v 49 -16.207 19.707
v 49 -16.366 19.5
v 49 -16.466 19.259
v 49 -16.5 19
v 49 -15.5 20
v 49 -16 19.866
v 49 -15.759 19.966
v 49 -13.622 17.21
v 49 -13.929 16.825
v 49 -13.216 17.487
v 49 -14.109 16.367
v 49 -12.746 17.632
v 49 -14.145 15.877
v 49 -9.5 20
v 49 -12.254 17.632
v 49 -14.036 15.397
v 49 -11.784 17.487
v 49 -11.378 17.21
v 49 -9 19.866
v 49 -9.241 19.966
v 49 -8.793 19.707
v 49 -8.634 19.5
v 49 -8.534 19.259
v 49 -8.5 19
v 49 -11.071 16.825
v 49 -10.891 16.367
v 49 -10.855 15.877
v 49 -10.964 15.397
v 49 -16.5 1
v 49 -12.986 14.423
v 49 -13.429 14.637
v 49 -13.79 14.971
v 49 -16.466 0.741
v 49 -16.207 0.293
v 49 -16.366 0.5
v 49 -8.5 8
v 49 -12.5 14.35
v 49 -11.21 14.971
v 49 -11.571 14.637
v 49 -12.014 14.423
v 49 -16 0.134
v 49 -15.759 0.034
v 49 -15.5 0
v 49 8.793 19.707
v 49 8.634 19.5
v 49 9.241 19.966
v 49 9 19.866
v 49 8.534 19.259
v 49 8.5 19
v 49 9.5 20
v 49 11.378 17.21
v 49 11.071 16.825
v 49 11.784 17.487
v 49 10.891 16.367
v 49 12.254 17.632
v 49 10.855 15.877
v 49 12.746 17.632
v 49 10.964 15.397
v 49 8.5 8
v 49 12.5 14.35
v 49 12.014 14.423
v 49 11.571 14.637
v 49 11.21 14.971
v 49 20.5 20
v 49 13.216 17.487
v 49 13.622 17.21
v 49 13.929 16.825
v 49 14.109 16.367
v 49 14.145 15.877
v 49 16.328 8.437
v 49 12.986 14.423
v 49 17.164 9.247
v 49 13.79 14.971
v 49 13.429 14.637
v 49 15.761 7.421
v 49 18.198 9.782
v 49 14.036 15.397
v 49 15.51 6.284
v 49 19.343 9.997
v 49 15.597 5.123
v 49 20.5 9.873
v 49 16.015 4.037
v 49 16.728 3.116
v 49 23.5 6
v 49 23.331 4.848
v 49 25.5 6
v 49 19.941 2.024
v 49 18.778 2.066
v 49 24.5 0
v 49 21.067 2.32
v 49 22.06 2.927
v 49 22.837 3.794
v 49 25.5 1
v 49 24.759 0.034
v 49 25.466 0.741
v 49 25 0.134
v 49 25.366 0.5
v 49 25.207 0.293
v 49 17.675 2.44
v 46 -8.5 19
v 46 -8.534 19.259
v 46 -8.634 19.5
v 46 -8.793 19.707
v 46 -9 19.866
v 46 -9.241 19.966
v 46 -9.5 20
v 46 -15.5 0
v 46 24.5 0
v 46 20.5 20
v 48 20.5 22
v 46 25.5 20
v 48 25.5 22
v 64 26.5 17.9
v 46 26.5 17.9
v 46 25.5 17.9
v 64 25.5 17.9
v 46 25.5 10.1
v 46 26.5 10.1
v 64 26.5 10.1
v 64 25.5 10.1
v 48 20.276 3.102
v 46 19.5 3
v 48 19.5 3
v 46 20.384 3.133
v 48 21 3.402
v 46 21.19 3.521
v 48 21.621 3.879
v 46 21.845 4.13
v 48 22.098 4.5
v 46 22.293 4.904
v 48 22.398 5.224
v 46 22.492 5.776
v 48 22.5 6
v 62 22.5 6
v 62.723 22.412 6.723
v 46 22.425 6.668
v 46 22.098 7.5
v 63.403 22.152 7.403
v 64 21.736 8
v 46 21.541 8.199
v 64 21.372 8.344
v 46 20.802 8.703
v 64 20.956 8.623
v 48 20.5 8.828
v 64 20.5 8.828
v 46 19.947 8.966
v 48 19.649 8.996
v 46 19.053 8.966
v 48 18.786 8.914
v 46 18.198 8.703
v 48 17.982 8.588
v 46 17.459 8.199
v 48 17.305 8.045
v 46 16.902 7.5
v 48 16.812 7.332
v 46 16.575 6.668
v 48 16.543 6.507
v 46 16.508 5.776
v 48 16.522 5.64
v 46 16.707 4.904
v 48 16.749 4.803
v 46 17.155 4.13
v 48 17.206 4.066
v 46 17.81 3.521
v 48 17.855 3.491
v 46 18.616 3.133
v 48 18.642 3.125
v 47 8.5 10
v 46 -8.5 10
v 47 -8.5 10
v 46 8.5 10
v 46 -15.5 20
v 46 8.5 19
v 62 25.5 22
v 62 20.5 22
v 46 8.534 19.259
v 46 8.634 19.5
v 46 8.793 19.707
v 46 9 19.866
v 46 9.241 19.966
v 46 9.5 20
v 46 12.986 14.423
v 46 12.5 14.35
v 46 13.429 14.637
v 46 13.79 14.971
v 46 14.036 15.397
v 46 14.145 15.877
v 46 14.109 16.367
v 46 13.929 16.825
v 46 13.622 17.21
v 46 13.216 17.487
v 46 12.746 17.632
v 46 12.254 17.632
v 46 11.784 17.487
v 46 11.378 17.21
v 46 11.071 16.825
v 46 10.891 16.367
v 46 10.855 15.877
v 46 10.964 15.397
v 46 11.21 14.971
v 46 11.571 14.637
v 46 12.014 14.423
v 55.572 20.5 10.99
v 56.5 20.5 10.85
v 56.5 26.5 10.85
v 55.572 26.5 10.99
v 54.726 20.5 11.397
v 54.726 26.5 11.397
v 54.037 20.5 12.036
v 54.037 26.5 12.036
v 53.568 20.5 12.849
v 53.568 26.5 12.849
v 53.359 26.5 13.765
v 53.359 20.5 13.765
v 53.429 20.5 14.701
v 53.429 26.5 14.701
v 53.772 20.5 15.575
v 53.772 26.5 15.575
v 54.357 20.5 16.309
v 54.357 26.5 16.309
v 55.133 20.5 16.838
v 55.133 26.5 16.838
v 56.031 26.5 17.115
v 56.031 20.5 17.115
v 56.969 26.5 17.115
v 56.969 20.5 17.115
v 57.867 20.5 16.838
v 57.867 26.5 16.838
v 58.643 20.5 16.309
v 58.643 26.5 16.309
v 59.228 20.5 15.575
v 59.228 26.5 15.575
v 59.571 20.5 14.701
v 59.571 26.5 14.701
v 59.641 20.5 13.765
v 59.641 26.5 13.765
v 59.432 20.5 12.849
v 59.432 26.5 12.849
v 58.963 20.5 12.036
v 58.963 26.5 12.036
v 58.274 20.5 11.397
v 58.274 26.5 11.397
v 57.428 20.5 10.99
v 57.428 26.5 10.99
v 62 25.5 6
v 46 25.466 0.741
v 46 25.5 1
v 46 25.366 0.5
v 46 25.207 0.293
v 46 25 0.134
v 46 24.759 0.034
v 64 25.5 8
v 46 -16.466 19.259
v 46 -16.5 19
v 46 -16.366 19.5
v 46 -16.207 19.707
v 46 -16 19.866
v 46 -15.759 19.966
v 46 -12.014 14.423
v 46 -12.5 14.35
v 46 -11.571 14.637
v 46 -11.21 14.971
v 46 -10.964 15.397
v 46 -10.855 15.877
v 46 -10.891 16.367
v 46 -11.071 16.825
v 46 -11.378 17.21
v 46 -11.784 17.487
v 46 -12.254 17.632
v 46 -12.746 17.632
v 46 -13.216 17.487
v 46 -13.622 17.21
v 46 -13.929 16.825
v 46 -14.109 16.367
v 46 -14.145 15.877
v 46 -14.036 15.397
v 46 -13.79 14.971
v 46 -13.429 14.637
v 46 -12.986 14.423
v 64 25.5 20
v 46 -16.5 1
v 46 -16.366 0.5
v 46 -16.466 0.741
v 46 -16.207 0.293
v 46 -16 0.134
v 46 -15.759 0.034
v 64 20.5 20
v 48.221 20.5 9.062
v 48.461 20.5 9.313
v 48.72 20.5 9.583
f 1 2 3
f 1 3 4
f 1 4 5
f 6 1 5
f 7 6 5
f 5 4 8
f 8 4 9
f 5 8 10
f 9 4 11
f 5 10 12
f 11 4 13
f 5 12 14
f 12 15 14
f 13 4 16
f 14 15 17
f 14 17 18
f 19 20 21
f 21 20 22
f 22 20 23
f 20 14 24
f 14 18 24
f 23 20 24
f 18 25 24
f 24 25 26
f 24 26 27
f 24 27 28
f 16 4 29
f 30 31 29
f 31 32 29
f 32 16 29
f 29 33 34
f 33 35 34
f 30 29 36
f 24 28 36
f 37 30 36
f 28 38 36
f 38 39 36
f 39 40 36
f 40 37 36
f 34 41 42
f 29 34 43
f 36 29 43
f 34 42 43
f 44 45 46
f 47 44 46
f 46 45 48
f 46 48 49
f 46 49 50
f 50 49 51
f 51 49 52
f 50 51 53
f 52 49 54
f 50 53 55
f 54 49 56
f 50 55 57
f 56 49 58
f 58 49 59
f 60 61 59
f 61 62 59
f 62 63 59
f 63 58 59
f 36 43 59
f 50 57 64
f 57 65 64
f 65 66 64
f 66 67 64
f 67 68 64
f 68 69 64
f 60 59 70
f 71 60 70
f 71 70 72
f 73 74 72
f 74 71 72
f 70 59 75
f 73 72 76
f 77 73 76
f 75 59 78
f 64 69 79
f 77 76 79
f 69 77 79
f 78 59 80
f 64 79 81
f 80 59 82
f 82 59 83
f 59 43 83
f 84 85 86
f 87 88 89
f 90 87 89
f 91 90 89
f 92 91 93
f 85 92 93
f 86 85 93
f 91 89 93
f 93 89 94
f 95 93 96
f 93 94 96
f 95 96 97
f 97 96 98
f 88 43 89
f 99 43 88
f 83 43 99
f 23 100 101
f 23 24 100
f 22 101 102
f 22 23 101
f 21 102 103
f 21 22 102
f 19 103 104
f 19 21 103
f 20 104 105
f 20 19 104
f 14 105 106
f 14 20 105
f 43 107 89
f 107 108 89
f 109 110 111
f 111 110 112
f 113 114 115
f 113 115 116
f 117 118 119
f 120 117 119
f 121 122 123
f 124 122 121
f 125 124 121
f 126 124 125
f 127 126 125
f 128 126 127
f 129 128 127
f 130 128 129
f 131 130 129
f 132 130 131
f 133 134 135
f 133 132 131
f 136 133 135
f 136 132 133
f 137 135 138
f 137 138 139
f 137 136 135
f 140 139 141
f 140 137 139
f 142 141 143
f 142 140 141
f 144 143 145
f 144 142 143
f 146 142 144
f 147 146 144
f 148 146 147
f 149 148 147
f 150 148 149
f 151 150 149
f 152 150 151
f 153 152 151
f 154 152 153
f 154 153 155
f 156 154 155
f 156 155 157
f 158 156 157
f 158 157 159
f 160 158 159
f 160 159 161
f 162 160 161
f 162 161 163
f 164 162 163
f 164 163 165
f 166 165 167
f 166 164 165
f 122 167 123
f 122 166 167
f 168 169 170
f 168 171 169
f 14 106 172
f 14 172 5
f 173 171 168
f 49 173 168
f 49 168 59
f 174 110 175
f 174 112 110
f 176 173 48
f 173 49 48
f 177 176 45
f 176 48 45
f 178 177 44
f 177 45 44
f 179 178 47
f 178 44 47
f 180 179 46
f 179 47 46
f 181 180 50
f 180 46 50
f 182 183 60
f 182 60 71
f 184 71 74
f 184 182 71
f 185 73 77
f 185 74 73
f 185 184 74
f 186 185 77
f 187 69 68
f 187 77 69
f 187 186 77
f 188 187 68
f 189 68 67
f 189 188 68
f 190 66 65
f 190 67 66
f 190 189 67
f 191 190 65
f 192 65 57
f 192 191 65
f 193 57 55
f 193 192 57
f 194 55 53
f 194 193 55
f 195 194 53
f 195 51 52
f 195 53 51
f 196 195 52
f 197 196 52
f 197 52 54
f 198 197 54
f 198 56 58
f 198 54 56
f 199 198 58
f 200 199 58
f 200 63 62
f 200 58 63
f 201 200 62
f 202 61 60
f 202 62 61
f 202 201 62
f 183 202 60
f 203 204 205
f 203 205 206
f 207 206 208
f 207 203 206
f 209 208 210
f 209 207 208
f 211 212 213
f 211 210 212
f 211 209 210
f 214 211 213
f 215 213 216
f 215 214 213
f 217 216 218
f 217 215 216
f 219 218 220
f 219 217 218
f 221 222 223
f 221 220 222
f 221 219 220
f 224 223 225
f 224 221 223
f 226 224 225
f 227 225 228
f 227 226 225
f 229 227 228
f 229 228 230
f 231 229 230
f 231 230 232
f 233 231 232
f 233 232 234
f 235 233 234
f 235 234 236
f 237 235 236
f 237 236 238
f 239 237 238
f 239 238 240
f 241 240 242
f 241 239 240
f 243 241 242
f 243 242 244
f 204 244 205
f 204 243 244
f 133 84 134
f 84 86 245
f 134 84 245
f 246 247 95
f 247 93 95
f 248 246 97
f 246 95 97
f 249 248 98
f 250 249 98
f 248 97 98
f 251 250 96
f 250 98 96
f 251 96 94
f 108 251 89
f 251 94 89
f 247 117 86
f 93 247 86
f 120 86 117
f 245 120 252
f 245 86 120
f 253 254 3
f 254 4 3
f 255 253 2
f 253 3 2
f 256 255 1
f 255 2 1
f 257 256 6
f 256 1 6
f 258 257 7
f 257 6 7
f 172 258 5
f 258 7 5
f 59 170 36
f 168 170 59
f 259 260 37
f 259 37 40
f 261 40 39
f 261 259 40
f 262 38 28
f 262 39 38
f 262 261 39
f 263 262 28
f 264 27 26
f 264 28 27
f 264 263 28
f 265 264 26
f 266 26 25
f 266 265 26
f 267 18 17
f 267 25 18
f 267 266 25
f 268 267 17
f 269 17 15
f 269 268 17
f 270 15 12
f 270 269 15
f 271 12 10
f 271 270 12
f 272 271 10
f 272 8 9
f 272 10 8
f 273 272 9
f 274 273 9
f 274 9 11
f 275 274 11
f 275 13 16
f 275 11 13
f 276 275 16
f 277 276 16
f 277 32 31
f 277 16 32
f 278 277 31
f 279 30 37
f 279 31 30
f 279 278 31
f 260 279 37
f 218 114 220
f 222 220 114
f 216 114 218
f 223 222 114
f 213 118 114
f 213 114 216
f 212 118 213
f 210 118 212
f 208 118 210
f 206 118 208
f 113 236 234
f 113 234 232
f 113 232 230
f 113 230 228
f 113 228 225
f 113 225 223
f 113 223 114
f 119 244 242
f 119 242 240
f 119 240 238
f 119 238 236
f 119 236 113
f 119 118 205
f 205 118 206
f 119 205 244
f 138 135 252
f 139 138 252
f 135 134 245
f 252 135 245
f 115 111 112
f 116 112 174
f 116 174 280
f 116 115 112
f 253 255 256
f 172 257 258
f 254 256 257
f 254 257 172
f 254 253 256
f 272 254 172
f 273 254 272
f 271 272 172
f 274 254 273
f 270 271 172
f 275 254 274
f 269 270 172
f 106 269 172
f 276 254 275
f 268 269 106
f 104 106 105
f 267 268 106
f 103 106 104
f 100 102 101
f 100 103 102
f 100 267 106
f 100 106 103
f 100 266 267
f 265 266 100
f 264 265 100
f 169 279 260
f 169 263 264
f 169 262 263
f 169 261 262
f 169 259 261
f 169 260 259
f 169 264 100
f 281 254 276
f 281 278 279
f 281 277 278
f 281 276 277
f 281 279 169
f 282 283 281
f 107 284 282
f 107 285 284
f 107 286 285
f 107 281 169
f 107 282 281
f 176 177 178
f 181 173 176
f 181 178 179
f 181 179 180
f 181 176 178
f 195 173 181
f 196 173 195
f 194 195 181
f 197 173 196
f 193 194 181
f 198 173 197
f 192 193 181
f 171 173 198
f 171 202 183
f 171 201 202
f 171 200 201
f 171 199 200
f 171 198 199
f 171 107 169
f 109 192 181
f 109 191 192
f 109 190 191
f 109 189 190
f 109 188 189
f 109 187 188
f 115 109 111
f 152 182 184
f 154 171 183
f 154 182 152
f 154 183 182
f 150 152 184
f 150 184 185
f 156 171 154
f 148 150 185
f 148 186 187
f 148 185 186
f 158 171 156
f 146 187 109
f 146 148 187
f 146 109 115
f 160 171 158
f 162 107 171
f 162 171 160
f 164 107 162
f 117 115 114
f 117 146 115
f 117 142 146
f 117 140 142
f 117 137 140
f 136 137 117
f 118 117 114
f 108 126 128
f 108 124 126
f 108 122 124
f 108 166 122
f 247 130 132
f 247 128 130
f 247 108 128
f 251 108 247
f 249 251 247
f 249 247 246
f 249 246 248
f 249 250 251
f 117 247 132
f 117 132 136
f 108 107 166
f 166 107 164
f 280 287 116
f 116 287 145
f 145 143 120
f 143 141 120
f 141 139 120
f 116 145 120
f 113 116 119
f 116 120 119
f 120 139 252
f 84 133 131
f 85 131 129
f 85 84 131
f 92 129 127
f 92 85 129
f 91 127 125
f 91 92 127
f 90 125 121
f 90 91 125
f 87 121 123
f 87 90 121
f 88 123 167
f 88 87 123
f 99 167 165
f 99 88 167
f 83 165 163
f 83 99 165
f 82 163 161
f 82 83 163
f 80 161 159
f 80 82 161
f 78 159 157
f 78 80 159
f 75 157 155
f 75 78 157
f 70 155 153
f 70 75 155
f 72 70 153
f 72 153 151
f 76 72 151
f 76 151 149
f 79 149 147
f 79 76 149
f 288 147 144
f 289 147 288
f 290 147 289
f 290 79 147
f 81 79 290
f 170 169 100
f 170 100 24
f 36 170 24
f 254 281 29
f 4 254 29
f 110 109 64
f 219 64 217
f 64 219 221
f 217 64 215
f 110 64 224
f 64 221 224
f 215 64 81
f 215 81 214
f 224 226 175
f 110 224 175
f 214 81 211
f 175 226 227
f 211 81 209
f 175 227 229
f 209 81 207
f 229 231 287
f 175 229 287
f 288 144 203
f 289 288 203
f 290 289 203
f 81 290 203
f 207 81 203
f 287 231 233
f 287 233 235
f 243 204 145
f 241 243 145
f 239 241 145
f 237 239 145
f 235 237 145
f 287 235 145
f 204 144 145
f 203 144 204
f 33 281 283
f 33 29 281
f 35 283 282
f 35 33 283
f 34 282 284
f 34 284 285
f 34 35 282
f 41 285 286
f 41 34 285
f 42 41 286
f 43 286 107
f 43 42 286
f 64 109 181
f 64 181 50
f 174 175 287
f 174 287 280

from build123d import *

# Parameters (mm, degrees)
CYLINDER055_R            = 3
CYLINDER055_DEPTH        = 26
CYLINDER047_R            = 1.65
CYLINDER047_DEPTH        = 23
CYLINDER046_R            = 1.65
CYLINDER046_DEPTH        = 23
BOX079_W                 = 3
BOX079_H                 = 17
BOX079_DEPTH             = 20
FILLET005015030019017_R  = 1
BOX080_W                 = 3
BOX080_H                 = 17
BOX080_DEPTH             = 10
CHAMFER010015011014_SIZE = 2
BOX078_W                 = 3
BOX078_H                 = 8
BOX078_DEPTH             = 20
FILLET005015030019016_R  = 1
CYLINDER054_R            = 3.15
CYLINDER054_DEPTH        = 10
BOX082_W                 = 18
BOX082_H                 = 1
BOX082_DEPTH             = 7.8
BOX081_W                 = 18
BOX081_H                 = 5
BOX081_DEPTH             = 16
CHAMFER010015011015_SIZE = 2
CHAMFER010015011016_SIZE = 1


with BuildPart() as cylinder055:
    # Cylinder055 → Cylinder055 (new body)
    with BuildSketch(Plane(origin=(40, 19.5, 6), x_dir=(0, 0, -1), z_dir=(1, 0, 0))):
        Circle(CYLINDER055_R)
    extrude(amount=CYLINDER055_DEPTH)


with BuildPart() as cylinder047:
    # Cylinder047 → Cylinder047 (new body)
    with BuildSketch(Plane(origin=(37, 12.5, 16), x_dir=(0, 0, -1), z_dir=(1, 0, 0))):
        Circle(CYLINDER047_R)
    extrude(amount=CYLINDER047_DEPTH)


with BuildPart() as fusion001021004009015013018008006003:
    # Cylinder046 → Cylinder046 (new body)
    with BuildSketch(Plane(origin=(37, -12.5, 16), x_dir=(0, 0, -1), z_dir=(1, 0, 0))):
        Circle(CYLINDER046_R)
    extrude(amount=CYLINDER046_DEPTH)

    # Fusion001021004009015013018008006003: union Cylinder047
    add(cylinder047.part)


with BuildPart() as fillet005015030019017:
    # Box079 → Box079 (new body)
    with BuildSketch(Plane(origin=(46, 8.5, 0), x_dir=(1, 0, 0), z_dir=(0, 0, 1))):
        with Locations((1.5, 8.5)):
            Rectangle(BOX079_W, BOX079_H)
    extrude(amount=BOX079_DEPTH)

    # Fillet005015030019017
    fillet005015030019017_edges = [fillet005015030019017.edges().sort_by_distance(p)[0] for p in [
        (47.5, 8.5, 20),
        (47.5, 25.5, 0),
    ]]
    fillet(fillet005015030019017_edges, radius=FILLET005015030019017_R)


with BuildPart() as chamfer010015011014:
    # Box080 → Box080 (new body)
    with BuildSketch(Plane(origin=(46, -8.5, 0), x_dir=(1, 0, 0), z_dir=(0, 0, 1))):
        with Locations((1.5, 8.5)):
            Rectangle(BOX080_W, BOX080_H)
    extrude(amount=BOX080_DEPTH)

    # Chamfer010015011014
    chamfer010015011014_edges = [chamfer010015011014.edges().sort_by_distance(p)[0] for p in [
        (49, 0, 10),
    ]]
    chamfer(chamfer010015011014_edges, length=CHAMFER010015011014_SIZE)


with BuildPart() as fillet005015030019016:
    # Box078 → Box078 (new body)
    with BuildSketch(Plane(origin=(46, -16.5, 0), x_dir=(1, 0, 0), z_dir=(0, 0, 1))):
        with Locations((1.5, 4)):
            Rectangle(BOX078_W, BOX078_H)
    extrude(amount=BOX078_DEPTH)

    # Fillet005015030019016
    fillet005015030019016_edges = [fillet005015030019016.edges().sort_by_distance(p)[0] for p in [
        (47.5, -16.5, 0),
        (47.5, -16.5, 20),
        (47.5, -8.5, 20),
    ]]
    fillet(fillet005015030019016_edges, radius=FILLET005015030019016_R)


with BuildPart() as cylinder054:
    # Cylinder054 → Cylinder054 (new body)
    with BuildSketch(Plane(origin=(56.5, 17.5, 14), x_dir=(0, 0, -1), z_dir=(0, 1, 0))):
        Circle(CYLINDER054_R)
    extrude(amount=CYLINDER054_DEPTH)


with BuildPart() as cube080:
    # Box082 → Box082 (new body)
    with BuildSketch(Plane(origin=(46, 25.5, 10.1), x_dir=(1, 0, 0), z_dir=(0, 0, 1))):
        with Locations((9, 0.5)):
            Rectangle(BOX082_W, BOX082_H)
    extrude(amount=BOX082_DEPTH)


with BuildPart() as chamfer010015011016:
    # Box081 → Box081 (new body)
    with BuildSketch(Plane(origin=(46, 20.5, 6), x_dir=(1, 0, 0), z_dir=(0, 0, 1))):
        with Locations((9, 2.5)):
            Rectangle(BOX081_W, BOX081_H)
    extrude(amount=BOX081_DEPTH)

    # Chamfer010015011015
    chamfer010015011015_edges = [chamfer010015011016.edges().sort_by_distance(p)[0] for p in [
        (46, 23, 22),
        (64, 23, 22),
        (64, 23, 6),
    ]]
    chamfer(chamfer010015011015_edges, length=CHAMFER010015011015_SIZE)

    # Fusion001021004009015013018008006004: union Cube080
    add(cube080.part)

    # Cut019003010005001012: cut Cylinder054
    add(cylinder054.part, mode=Mode.SUBTRACT)

    # Fusion001021004009015013018008006005: union Fillet005015030019017, Chamfer010015011014, Fillet005015030019016
    add(fillet005015030019017.part)
    add(chamfer010015011014.part)
    add(fillet005015030019016.part)

    # Cut019003010005001013: cut Fusion001021004009015013018008006003
    add(fusion001021004009015013018008006003.part, mode=Mode.SUBTRACT)

    # Cut019003010005001014: cut Cylinder055
    add(cylinder055.part, mode=Mode.SUBTRACT)

    # Chamfer010015011016
    chamfer010015011016_edges = [chamfer010015011016.edges().sort_by_distance(p)[0] for p in [
        (49, 16.543204, 6.507306),
    ]]
    chamfer(chamfer010015011016_edges, length=CHAMFER010015011016_SIZE)


solid = chamfer010015011016.part
